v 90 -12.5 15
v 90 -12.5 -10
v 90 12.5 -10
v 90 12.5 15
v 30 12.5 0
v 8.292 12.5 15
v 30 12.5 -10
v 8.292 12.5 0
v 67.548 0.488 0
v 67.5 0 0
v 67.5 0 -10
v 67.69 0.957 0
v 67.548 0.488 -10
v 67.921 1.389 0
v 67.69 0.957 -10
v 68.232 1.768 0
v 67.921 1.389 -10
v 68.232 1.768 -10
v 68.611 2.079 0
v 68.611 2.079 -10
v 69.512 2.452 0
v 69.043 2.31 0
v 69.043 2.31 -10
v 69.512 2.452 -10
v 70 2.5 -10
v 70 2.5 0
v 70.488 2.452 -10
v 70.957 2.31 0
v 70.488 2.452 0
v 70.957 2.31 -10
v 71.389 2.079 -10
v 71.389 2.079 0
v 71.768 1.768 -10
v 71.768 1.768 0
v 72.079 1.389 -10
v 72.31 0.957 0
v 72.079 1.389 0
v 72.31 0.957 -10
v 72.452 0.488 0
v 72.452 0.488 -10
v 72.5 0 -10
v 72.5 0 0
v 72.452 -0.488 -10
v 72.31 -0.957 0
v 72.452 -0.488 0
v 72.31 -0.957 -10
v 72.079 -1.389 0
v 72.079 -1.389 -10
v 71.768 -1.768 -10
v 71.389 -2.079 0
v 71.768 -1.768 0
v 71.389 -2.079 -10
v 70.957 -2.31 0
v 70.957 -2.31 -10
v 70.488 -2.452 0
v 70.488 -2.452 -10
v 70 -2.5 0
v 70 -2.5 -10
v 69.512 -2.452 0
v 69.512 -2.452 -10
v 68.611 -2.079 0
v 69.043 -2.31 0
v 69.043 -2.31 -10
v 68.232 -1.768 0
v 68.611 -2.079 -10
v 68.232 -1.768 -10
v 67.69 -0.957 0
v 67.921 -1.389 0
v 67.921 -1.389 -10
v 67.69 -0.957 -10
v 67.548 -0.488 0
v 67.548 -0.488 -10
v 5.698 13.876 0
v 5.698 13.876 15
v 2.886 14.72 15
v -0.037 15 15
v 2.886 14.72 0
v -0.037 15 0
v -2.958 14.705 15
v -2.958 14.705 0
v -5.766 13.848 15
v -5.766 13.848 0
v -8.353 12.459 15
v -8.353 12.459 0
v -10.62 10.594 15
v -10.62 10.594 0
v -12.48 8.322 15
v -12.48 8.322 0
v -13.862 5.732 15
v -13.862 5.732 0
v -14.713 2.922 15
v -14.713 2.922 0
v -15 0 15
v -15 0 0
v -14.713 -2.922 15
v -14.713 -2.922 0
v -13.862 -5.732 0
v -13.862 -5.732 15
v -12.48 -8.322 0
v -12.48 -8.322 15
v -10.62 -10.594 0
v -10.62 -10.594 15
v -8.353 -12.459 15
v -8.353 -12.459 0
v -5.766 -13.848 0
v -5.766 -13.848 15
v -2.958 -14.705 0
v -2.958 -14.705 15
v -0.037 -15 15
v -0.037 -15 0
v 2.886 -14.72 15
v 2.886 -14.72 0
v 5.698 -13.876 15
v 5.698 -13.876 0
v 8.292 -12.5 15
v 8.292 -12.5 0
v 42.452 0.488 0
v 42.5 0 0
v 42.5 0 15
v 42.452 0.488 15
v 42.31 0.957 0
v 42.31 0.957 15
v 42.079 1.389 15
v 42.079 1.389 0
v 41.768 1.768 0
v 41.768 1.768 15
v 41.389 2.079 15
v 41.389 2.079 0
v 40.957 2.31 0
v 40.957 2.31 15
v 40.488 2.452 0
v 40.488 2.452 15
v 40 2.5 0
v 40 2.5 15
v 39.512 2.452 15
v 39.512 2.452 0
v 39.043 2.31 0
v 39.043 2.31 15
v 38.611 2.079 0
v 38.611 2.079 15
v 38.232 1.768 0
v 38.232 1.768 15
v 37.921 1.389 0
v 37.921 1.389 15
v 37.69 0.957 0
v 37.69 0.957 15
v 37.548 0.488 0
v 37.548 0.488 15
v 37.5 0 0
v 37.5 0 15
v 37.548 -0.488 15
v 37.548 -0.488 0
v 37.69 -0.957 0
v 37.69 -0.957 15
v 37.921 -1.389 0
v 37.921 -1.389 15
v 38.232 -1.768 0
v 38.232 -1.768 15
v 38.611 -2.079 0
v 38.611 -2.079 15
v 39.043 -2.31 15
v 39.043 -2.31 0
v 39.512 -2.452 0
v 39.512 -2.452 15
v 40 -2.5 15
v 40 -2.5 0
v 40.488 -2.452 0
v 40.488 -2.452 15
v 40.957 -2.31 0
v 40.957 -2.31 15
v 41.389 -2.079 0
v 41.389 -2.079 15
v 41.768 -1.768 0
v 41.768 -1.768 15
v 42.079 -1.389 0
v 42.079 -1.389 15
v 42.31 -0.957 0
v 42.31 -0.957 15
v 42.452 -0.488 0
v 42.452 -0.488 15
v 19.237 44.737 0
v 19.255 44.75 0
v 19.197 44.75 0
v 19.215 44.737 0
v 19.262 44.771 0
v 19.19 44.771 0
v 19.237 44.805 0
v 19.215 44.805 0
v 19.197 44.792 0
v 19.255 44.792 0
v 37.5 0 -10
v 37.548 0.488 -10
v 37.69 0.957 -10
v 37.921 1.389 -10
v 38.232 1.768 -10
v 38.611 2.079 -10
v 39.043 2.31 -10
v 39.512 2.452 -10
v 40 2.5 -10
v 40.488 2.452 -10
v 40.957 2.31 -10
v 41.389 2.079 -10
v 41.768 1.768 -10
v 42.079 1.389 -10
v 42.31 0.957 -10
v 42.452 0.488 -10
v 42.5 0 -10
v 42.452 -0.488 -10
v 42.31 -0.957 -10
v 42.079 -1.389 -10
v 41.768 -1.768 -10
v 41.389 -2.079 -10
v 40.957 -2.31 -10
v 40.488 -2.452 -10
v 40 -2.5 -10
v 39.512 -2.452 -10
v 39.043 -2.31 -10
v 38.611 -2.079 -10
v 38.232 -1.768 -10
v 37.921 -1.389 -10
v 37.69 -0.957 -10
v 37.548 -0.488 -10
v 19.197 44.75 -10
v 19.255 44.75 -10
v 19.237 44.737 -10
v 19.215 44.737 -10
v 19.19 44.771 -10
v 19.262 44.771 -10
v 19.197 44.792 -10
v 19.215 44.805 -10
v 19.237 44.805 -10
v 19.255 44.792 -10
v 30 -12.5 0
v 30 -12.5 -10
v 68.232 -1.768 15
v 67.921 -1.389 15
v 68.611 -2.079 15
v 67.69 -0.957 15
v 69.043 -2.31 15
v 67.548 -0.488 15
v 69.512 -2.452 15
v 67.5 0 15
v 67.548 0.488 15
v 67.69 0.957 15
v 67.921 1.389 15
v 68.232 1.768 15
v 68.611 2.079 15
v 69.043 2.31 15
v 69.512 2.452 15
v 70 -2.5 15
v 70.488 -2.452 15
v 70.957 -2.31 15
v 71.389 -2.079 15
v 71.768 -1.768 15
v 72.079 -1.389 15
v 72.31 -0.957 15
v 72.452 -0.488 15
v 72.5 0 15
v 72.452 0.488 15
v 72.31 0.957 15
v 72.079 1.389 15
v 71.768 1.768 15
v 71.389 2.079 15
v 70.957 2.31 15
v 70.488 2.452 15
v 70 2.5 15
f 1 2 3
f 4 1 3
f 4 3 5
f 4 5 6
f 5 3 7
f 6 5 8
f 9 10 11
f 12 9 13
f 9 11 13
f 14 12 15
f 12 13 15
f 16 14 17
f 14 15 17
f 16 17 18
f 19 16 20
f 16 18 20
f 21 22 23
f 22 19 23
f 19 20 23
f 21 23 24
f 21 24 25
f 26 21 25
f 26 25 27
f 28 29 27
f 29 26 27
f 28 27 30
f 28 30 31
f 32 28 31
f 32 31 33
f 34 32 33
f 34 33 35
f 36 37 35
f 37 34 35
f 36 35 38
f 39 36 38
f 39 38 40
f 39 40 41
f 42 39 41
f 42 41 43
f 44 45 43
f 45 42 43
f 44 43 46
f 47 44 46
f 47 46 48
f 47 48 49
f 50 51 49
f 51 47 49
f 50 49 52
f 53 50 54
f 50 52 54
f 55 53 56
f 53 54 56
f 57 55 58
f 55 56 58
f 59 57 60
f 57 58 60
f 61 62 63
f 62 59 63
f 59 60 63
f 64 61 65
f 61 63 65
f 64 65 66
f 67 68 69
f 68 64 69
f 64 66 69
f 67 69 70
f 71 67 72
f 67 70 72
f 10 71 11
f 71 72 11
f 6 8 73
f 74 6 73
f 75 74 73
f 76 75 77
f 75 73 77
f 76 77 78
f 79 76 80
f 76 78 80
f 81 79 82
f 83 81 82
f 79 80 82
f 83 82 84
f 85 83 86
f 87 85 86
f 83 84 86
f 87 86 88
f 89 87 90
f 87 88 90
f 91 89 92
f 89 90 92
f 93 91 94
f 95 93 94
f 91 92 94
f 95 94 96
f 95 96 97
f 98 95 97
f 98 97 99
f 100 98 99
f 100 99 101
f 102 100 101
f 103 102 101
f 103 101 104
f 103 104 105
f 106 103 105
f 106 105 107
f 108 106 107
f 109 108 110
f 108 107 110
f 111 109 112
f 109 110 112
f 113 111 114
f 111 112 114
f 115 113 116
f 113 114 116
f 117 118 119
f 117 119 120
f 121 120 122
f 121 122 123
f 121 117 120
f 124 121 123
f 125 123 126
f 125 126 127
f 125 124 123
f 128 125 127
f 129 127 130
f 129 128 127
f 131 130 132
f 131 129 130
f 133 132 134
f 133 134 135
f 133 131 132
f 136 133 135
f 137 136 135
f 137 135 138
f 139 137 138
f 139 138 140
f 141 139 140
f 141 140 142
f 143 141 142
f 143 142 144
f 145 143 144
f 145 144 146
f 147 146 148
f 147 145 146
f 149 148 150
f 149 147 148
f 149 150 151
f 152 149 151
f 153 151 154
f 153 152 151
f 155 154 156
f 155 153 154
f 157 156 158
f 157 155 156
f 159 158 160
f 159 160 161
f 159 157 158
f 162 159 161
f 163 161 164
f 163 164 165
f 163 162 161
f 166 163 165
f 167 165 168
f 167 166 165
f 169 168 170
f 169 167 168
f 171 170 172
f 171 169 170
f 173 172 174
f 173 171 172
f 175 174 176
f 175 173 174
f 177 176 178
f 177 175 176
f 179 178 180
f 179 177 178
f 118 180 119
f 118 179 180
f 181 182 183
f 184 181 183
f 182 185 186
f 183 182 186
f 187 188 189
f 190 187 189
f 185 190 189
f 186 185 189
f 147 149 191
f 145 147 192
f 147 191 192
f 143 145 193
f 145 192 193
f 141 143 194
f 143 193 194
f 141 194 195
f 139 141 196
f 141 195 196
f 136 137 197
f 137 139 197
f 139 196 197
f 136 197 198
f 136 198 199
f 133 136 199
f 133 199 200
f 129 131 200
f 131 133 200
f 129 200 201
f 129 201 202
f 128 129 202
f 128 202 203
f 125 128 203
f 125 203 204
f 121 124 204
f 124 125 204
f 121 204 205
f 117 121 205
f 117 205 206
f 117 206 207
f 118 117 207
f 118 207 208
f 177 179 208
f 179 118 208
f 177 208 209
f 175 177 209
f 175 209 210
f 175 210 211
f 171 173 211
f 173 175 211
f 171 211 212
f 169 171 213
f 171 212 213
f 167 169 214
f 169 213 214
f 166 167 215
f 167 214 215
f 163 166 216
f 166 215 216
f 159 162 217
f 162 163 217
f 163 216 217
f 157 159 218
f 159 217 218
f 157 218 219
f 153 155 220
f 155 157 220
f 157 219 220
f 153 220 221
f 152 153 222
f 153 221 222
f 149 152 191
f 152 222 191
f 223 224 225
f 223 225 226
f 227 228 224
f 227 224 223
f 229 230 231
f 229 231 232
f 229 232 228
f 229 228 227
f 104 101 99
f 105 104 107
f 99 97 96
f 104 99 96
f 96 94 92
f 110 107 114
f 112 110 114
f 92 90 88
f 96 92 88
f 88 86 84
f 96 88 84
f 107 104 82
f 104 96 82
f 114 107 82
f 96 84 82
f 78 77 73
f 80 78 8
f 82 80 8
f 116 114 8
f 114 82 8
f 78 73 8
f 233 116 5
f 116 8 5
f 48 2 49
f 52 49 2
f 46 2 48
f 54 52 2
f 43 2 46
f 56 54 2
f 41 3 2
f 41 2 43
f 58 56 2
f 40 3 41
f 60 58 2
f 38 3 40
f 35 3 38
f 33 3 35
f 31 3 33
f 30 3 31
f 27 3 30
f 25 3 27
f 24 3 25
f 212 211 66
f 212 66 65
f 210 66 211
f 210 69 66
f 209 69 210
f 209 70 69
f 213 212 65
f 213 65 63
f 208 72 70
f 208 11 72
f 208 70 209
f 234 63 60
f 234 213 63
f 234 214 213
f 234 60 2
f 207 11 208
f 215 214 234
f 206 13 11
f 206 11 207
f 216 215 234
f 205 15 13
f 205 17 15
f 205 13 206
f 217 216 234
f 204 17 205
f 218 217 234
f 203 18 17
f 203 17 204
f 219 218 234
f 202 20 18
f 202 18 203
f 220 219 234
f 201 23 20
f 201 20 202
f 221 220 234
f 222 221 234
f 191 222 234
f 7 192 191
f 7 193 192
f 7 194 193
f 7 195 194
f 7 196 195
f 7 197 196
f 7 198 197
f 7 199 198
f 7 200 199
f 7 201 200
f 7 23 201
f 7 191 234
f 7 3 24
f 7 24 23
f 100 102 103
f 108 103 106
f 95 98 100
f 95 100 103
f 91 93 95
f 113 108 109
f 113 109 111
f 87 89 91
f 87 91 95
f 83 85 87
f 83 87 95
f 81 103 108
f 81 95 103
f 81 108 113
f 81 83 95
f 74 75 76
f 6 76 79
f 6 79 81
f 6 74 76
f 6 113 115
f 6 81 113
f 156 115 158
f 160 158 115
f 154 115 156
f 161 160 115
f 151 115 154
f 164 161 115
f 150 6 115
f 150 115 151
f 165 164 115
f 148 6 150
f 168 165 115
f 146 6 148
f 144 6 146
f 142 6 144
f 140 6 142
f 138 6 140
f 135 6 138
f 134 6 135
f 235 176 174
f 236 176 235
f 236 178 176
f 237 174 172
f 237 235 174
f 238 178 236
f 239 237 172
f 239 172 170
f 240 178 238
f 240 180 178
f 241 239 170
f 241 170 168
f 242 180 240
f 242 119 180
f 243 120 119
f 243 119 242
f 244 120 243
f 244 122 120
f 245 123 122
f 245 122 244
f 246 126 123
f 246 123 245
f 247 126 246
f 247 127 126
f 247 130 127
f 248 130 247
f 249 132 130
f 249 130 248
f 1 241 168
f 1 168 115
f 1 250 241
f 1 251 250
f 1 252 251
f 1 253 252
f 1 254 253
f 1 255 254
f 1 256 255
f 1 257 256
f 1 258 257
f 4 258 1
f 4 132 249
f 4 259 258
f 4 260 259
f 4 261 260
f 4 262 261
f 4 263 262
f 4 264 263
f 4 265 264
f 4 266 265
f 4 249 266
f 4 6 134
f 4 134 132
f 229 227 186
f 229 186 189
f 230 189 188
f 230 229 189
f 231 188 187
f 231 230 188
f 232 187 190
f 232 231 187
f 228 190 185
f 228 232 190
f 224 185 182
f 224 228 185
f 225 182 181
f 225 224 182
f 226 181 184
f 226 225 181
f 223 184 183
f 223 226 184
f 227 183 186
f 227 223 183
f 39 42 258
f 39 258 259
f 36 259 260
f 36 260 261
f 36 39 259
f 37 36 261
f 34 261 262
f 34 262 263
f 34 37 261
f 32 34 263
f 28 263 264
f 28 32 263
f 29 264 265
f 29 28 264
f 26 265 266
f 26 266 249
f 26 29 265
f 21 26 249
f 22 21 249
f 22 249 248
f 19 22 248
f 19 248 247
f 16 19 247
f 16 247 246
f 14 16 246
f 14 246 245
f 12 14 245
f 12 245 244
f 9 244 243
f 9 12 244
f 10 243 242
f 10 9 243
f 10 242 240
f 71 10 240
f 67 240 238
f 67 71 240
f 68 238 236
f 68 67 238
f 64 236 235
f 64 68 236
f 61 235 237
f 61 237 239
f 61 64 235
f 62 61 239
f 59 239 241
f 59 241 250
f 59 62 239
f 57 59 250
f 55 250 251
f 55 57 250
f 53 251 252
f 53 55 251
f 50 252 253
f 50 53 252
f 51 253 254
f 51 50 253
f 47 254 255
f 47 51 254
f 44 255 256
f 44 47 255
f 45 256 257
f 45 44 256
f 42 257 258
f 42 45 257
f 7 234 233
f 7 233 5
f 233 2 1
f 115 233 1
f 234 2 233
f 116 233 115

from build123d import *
from build123d.topology import SkipClean

# Parameters (mm, degrees)
SKETCH2_R           = 2.5
BOSS_EXTRUDE1_DEPTH = 15
BOSS_EXTRUDE2_START = 10
SKETCH3_R           = 0.035747797
SKETCH3_W           = 60
SKETCH3_H           = 25
SKETCH3_R_2         = 2.5
BOSS_EXTRUDE2_DEPTH = 10


with BuildPart() as part:
    # Sketch2 → Boss-Extrude1 (new body)
    # profile 1 of 5: a face of its own
    with BuildSketch(Plane.XY):
        with BuildLine():
            Line((0, -12.5), (0, 12.5))
            Line((0, 12.5), (8.291561976, 12.5))
            ThreePointArc((8.291561976, 12.5), (-15, 0), (8.291561976, -12.5))
            Line((8.291561976, -12.5), (0, -12.5))
        make_face()
    # profile 2 of 5: a face of its own
    with BuildSketch(Plane.XY):
        with BuildLine():
            Line((8.291561976, 12.5), (0, 12.5))
            Line((0, 12.5), (0, -12.5))
            Line((0, -12.5), (8.291561976, -12.5))
            ThreePointArc((8.291561976, -12.5), (13.216910184, -7.093185827), (15, 0))
            ThreePointArc((15, 0), (13.216910184, 7.093185827), (8.291561976, 12.5))
        make_face()
    # profile 3 of 5: a face of its own
    with BuildSketch(Plane.XY):
        with BuildLine():
            Line((0, -12.5), (0, 12.5))
            Line((0, 12.5), (8.291561976, 12.5))
            ThreePointArc((8.291561976, 12.5), (-15, 0), (8.291561976, -12.5))
            Line((8.291561976, -12.5), (0, -12.5))
        make_face()
    # profile 4 of 5: a face of its own
    with BuildSketch(Plane.XY):
        with BuildLine():
            Line((8.291561976, 12.5), (0, 12.5))
            Line((0, 12.5), (0, -12.5))
            Line((0, -12.5), (8.291561976, -12.5))
            ThreePointArc((8.291561976, -12.5), (13.216910184, -7.093185827), (15, 0))
            ThreePointArc((15, 0), (13.216910184, 7.093185827), (8.291561976, 12.5))
        make_face()
    # profile 5 of 5: a face of its own
    with BuildSketch(Plane.XY):
        with BuildLine():
            Line((90, 12.5), (8.291561976, 12.5))
            ThreePointArc((8.291561976, 12.5), (13.216910184, 7.093185827), (15, 0))
            ThreePointArc((15, 0), (13.216910184, -7.093185827), (8.291561976, -12.5))
            Line((8.291561976, -12.5), (90, -12.5))
            Line((90, -12.5), (90, 12.5))
        make_face()
        with Locations((40, 0)):
            Circle(SKETCH2_R, mode=Mode.SUBTRACT)
        with Locations((70, 0)):
            Circle(SKETCH2_R, mode=Mode.SUBTRACT)
    extrude(amount=BOSS_EXTRUDE1_DEPTH)

    # Sketch3 → Boss-Extrude2 (add)
    # profile 1 of 2: a face of its own
    with SkipClean():  # the faces are left unmerged after this step: merging them gives an invalid solid
        with BuildSketch(Plane(origin=(0, 0, 0), x_dir=(-1, 0, 0), z_dir=(0, 0, -1)).offset(BOSS_EXTRUDE2_START)):
            with Locations((-19.225929264, 44.771435035)):
                Circle(SKETCH3_R)
        # profile 2 of 2: a face of its own
        with BuildSketch(Plane(origin=(0, 0, 0), x_dir=(-1, 0, 0), z_dir=(0, 0, -1)).offset(BOSS_EXTRUDE2_START)):
            with Locations((-60, 0)):
                Rectangle(SKETCH3_W, SKETCH3_H)
            with Locations((-40, 0)):
                Circle(SKETCH3_R_2, mode=Mode.SUBTRACT)
            with Locations((-70, 0)):
                Circle(SKETCH3_R_2, mode=Mode.SUBTRACT)
        extrude(amount=-BOSS_EXTRUDE2_DEPTH)


with BuildPart() as boss_extrude2_piece_1:
    # of the separate pieces the step leaves, piece 1, a body of its own (boss_extrude2_pieces)
    add(part.part.solids().sort_by_distance((8.291561976, -12.5, 0))[0])


with BuildPart() as boss_extrude2_piece_2:
    # of the separate pieces the step leaves, piece 2, a body of its own (boss_extrude2_pieces)
    add(part.part.solids().sort_by_distance((19.190181466, 44.771435035, -10))[0])


solid = Compound([boss_extrude2_piece_1.part, boss_extrude2_piece_2.part])
